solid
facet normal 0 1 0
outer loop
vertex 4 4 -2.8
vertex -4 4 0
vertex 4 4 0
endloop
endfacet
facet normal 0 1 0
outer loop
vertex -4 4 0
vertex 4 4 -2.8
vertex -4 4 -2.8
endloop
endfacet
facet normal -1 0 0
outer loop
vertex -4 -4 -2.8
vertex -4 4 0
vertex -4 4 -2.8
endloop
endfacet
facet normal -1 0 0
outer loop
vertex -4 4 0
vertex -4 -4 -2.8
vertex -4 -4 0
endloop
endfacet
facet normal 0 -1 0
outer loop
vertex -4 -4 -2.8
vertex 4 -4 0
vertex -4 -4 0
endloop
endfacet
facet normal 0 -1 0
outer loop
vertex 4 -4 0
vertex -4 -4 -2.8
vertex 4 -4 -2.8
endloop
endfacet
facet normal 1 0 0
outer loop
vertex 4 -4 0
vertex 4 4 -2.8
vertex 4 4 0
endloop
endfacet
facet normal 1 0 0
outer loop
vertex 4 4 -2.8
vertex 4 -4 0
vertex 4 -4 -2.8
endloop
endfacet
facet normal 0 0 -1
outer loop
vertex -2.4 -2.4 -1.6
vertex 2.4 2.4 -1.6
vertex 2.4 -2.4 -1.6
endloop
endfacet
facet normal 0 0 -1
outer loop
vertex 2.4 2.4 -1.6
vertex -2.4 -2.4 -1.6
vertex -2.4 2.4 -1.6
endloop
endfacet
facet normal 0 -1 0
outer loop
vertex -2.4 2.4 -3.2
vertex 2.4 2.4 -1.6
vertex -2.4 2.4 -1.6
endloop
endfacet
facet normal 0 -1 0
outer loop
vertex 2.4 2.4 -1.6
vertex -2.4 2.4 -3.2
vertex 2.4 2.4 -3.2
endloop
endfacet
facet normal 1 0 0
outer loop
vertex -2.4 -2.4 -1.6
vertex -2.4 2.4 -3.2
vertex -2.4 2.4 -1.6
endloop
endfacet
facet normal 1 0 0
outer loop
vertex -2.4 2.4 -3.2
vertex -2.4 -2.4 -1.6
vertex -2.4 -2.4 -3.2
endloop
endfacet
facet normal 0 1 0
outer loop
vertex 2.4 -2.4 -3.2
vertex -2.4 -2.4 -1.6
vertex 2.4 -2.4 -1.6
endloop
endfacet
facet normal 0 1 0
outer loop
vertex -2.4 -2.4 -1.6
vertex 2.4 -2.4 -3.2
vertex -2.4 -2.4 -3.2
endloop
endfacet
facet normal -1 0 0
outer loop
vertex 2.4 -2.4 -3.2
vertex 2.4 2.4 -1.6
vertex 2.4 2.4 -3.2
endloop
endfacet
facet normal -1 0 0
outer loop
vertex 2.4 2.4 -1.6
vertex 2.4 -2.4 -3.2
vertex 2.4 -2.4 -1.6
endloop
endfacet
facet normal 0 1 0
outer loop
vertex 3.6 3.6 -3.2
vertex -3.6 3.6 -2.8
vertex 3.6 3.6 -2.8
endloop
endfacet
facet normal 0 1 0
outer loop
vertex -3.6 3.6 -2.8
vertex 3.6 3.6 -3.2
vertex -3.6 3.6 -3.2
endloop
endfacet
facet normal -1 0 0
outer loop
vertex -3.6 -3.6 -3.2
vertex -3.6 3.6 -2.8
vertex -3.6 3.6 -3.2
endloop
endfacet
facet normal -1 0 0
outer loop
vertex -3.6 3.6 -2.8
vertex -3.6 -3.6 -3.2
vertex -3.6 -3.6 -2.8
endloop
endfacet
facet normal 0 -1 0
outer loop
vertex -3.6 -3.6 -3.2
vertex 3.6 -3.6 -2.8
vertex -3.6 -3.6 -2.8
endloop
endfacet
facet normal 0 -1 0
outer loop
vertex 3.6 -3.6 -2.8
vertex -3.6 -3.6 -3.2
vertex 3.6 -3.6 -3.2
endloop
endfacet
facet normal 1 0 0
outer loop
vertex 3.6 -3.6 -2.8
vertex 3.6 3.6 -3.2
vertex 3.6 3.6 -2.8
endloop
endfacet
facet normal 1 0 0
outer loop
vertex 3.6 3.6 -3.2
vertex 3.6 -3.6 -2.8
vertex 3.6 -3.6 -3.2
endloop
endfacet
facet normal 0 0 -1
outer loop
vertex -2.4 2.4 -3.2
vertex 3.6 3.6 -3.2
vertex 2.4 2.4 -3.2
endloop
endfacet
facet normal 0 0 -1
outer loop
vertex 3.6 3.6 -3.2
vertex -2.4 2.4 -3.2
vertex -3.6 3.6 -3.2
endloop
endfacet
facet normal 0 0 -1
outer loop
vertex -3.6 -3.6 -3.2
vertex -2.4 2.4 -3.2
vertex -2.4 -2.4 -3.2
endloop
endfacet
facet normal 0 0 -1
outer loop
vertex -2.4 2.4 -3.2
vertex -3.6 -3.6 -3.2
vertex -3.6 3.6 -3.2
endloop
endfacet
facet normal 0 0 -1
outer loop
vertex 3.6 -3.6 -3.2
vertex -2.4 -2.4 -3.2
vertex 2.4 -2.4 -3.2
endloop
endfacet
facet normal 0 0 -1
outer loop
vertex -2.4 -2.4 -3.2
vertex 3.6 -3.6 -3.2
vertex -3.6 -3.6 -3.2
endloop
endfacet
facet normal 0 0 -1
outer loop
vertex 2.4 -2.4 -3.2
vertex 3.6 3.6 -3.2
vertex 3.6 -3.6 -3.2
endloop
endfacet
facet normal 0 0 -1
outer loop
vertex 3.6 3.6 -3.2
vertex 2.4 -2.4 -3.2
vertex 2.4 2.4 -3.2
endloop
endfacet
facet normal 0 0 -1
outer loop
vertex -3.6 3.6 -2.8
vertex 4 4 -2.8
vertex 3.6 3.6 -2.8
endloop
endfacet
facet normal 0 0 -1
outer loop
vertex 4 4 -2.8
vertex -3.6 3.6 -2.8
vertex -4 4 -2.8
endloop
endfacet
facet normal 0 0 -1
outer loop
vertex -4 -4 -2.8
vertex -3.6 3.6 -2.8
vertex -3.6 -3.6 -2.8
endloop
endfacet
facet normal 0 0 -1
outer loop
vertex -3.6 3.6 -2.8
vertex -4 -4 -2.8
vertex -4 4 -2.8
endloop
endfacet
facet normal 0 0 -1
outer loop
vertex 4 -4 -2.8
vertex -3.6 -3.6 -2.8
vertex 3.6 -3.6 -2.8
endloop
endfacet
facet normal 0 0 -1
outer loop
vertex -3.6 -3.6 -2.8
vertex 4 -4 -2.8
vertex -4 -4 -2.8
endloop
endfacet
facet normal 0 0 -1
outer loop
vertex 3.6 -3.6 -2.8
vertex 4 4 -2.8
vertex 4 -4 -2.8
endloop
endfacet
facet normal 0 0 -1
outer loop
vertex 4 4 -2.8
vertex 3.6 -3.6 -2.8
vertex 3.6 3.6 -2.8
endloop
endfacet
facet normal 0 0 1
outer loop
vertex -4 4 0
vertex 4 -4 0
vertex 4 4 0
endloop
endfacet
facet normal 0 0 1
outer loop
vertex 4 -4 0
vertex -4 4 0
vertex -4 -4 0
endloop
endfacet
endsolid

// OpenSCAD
// file: ../p/box5.scad
use <../lib.scad>
function ldraw_lib__box5() = [
// 0 Box with 5 Faces and All Edges
// 0 Name: box5.dat
// 0 Author: James Jessiman
// 0 !LDRAW_ORG Primitive UPDATE 2012-01
// 0 !LICENSE Licensed under CC BY 4.0 : see CAreadme.txt
// 
// 0 BFC CERTIFY CCW
  [0,"BFC","CERTIFY"],
  [0,"BFC","CCW"],
// 
// 0 !HISTORY 2002-04-03 [sbliss] Modified for BFC compliance
// 0 !HISTORY 2002-04-25 [PTadmin] Official Update 2002-02
// 0 !HISTORY 2007-06-24 [PTadmin] Header formatted for Contributor Agreement
// 0 !HISTORY 2008-07-01 [PTadmin] Official Update 2008-01
// 0 !HISTORY 2012-02-16 [Philo] Changed to CCW
// 0 !HISTORY 2012-03-30 [PTadmin] Official Update 2012-01
// 
// 
// 2 24 1 1 1 -1 1 1
  [2,24,1,1,1,-1,1,1],
// 2 24 -1 1 1 -1 1 -1
  [2,24,-1,1,1,-1,1,-1],
// 2 24 -1 1 -1 1 1 -1
  [2,24,-1,1,-1,1,1,-1],
// 2 24 1 1 -1 1 1 1
  [2,24,1,1,-1,1,1,1],
// 2 24 1 0 1 -1 0 1
  [2,24,1,0,1,-1,0,1],
// 2 24 -1 0 1 -1 0 -1
  [2,24,-1,0,1,-1,0,-1],
// 2 24 -1 0 -1 1 0 -1
  [2,24,-1,0,-1,1,0,-1],
// 2 24 1 0 -1 1 0 1
  [2,24,1,0,-1,1,0,1],
// 2 24 1 0 1 1 1 1
  [2,24,1,0,1,1,1,1],
// 2 24 -1 0 1 -1 1 1
  [2,24,-1,0,1,-1,1,1],
// 2 24 1 0 -1 1 1 -1
  [2,24,1,0,-1,1,1,-1],
// 2 24 -1 0 -1 -1 1 -1
  [2,24,-1,0,-1,-1,1,-1],
// 4 16 -1 1 1 1 1 1 1 1 -1 -1 1 -1
  [4,16,-1,1,1,1,1,1,1,1,-1,-1,1,-1],
// 4 16 -1 1 1 -1 0 1 1 0 1 1 1 1
  [4,16,-1,1,1,-1,0,1,1,0,1,1,1,1],
// 4 16 -1 1 -1 -1 0 -1 -1 0 1 -1 1 1
  [4,16,-1,1,-1,-1,0,-1,-1,0,1,-1,1,1],
// 4 16 1 1 -1 1 0 -1 -1 0 -1 -1 1 -1
  [4,16,1,1,-1,1,0,-1,-1,0,-1,-1,1,-1],
// 4 16 1 1 1 1 0 1 1 0 -1 1 1 -1
  [4,16,1,1,1,1,0,1,1,0,-1,1,1,-1],
];
module ldraw_lib__box5(step=0, col=false, unit=2/5, alt=false, line=0.2, solid=!$preview)
    makepoly(ldraw_lib__box5(), step=step, col=col, unit=unit, alt=alt, line=line, solid=solid);
ldraw_lib__box5(line=0.2);
// file: ../p/box4.scad
use <../lib.scad>
function ldraw_lib__box4() = [
// 0 Box with 4 Faces (2 Parallel Pairs) and All Edges
// 0 Name: box4.dat
// 0 Author: James Jessiman
// 0 !LDRAW_ORG Primitive UPDATE 2012-01
// 0 !LICENSE Licensed under CC BY 4.0 : see CAreadme.txt
// 
// 0 BFC CERTIFY CCW
  [0,"BFC","CERTIFY"],
  [0,"BFC","CCW"],
// 
// 0 !HISTORY 2002-04-03 [sbliss] Modified for BFC compliance
// 0 !HISTORY 2002-04-25 [PTadmin] Official Update 2002-02
// 0 !HISTORY 2007-06-24 [PTadmin] Header formatted for Contributor Agreement
// 0 !HISTORY 2008-07-01 [PTadmin] Official Update 2008-01
// 0 !HISTORY 2012-02-16 [Philo] Changed to CCW
// 0 !HISTORY 2012-03-30 [PTadmin] Official Update 2012-01
// 
// 
// 2 24 1 1 1 -1 1 1
  [2,24,1,1,1,-1,1,1],
// 2 24 -1 1 1 -1 1 -1
  [2,24,-1,1,1,-1,1,-1],
// 2 24 -1 1 -1 1 1 -1
  [2,24,-1,1,-1,1,1,-1],
// 2 24 1 1 -1 1 1 1
  [2,24,1,1,-1,1,1,1],
// 2 24 1 0 1 -1 0 1
  [2,24,1,0,1,-1,0,1],
// 2 24 -1 0 1 -1 0 -1
  [2,24,-1,0,1,-1,0,-1],
// 2 24 -1 0 -1 1 0 -1
  [2,24,-1,0,-1,1,0,-1],
// 2 24 1 0 -1 1 0 1
  [2,24,1,0,-1,1,0,1],
// 2 24 1 0 1 1 1 1
  [2,24,1,0,1,1,1,1],
// 2 24 -1 0 1 -1 1 1
  [2,24,-1,0,1,-1,1,1],
// 2 24 1 0 -1 1 1 -1
  [2,24,1,0,-1,1,1,-1],
// 2 24 -1 0 -1 -1 1 -1
  [2,24,-1,0,-1,-1,1,-1],
// 4 16 -1 1 1 -1 0 1 1 0 1 1 1 1
  [4,16,-1,1,1,-1,0,1,1,0,1,1,1,1],
// 4 16 -1 1 -1 -1 0 -1 -1 0 1 -1 1 1
  [4,16,-1,1,-1,-1,0,-1,-1,0,1,-1,1,1],
// 4 16 1 1 -1 1 0 -1 -1 0 -1 -1 1 -1
  [4,16,1,1,-1,1,0,-1,-1,0,-1,-1,1,-1],
// 4 16 1 1 1 1 0 1 1 0 -1 1 1 -1
  [4,16,1,1,1,1,0,1,1,0,-1,1,1,-1],
];
module ldraw_lib__box4(step=0, col=false, unit=2/5, alt=false, line=0.2, solid=!$preview)
    makepoly(ldraw_lib__box4(), step=step, col=col, unit=unit, alt=alt, line=line, solid=solid);
ldraw_lib__box4(line=0.2);
// file: s/3070bs01.scad
use <../../lib.scad>
use <../../p/box4.scad>
use <../../p/box5.scad>
function ldraw_lib__s__3070bs01() = [
// 0 ~Tile  1 x  1 with Groove without Top Face
// 0 Name: s\3070bs01.dat
// 0 Author: Chris Dee [cwdee]
// 0 !LDRAW_ORG Subpart UPDATE 2009-02
// 0 !LICENSE Licensed under CC BY 4.0 : see CAreadme.txt
// 
// 0 BFC CERTIFY CCW
  [0,"BFC","CERTIFY"],
  [0,"BFC","CCW"],
// 
// 0 !HISTORY 2009-09-03 [PTadmin] Official Update 2009-02
// 
// 
// 1 16 0 0 0 10 0 0 0 7 0 0 0 10 box4.dat
  [1,16,0,0,0,10,0,0,0,7,0,0,0,10, ldraw_lib__box4()],
// 0 BFC INVERTNEXT
  [0,"BFC","INVERTNEXT"],
// 1 16 0 8 0 6 0 0 0 -4 0 0 0 6 box5.dat
  [1,16,0,8,0,6,0,0,0,-4,0,0,0,6, ldraw_lib__box5()],
// 1 16 0 7 0 9 0 0 0 1 0 0 0 9 box4.dat
  [1,16,0,7,0,9,0,0,0,1,0,0,0,9, ldraw_lib__box4()],
// 
// 4 16 9 8 9 6 8 6 -6 8 6 -9 8 9
  [4,16,9,8,9,6,8,6,-6,8,6,-9,8,9],
// 4 16 -9 8 9 -6 8 6 -6 8 -6 -9 8 -9
  [4,16,-9,8,9,-6,8,6,-6,8,-6,-9,8,-9],
// 4 16 -9 8 -9 -6 8 -6 6 8 -6 9 8 -9
  [4,16,-9,8,-9,-6,8,-6,6,8,-6,9,8,-9],
// 4 16 9 8 -9 6 8 -6 6 8 6 9 8 9
  [4,16,9,8,-9,6,8,-6,6,8,6,9,8,9],
// 
// 4 16 10 7 10 9 7 9 -9 7 9 -10 7 10
  [4,16,10,7,10,9,7,9,-9,7,9,-10,7,10],
// 4 16 -10 7 10 -9 7 9 -9 7 -9 -10 7 -10
  [4,16,-10,7,10,-9,7,9,-9,7,-9,-10,7,-10],
// 4 16 -10 7 -10 -9 7 -9 9 7 -9 10 7 -10
  [4,16,-10,7,-10,-9,7,-9,9,7,-9,10,7,-10],
// 4 16 10 7 -10 9 7 -9 9 7 9 10 7 10
  [4,16,10,7,-10,9,7,-9,9,7,9,10,7,10],
// 0
];
module ldraw_lib__s__3070bs01(step=0, col=false, unit=2/5, alt=false, line=0.2, solid=!$preview)
    makepoly(ldraw_lib__s__3070bs01(), step=step, col=col, unit=unit, alt=alt, line=line, solid=solid);
ldraw_lib__s__3070bs01(line=0.2);
// file: 3070b.scad
use <../lib.scad>
use <s/3070bs01.scad>
function ldraw_lib__3070b() = [
// 0 Tile  1 x  1 with Groove
// 0 Name: 3070b.dat
// 0 Author: Chris Dee [cwdee]
// 0 !LDRAW_ORG Part UPDATE 2009-02
// 0 !LICENSE Licensed under CC BY 4.0 : see CAreadme.txt
// 
// 0 BFC CERTIFY CW
  [0,"BFC","CERTIFY"],
  [0,"BFC","CW"],
// 
// 0 !HISTORY 2009-09-03 [PTadmin] Official Update 2009-02
// 
// 
// 1 16 0 0 0 1 0 0 0 1 0 0 0 1 s\3070bs01.dat
  [1,16,0,0,0,1,0,0,0,1,0,0,0,1, ldraw_lib__s__3070bs01()],
// 4 16 10 0 10 10 0 -10 -10 0 -10 -10 0 10
  [4,16,10,0,10,10,0,-10,-10,0,-10,-10,0,10],
// 0
];
module ldraw_lib__3070b(step=0, col=false, unit=2/5, alt=false, line=0.2, solid=!$preview)
    makepoly(ldraw_lib__3070b(), step=step, col=col, unit=unit, alt=alt, line=line, solid=solid);
ldraw_lib__3070b(line=0.2);
// main file
use <../lib.scad>
use <3070b.scad>
function ldraw_lib__307024() = [
// 0 ~_Tile  1 x  1 with Groove Yellow (Obsolete)
// 0 Name: 307024.dat
// 0 Author: Michael Heidemann [mikeheide]
// 0 !LDRAW_ORG Part Physical_Colour UPDATE 2019-02
// 0 !LICENSE Licensed under CC BY 4.0 : see CAreadme.txt
// 
// 0 BFC CERTIFY CCW
  [0,"BFC","CERTIFY"],
  [0,"BFC","CCW"],
// 
// 0 !CATEGORY Obsolete
// 
// 0 !HISTORY 2010-12-31 [PTadmin] Official Update 2010-03
// 0 !HISTORY 2019-07-22 [Holly-Wood] Obsoleted per decision not to include physical colour parts
// 0 !HISTORY 2019-09-09 [PTadmin] Official Update 2019-02
// 
// 
// 0 // This file is a "shortcut" with the correct number for the actual
// 0 // colouring of the part (Yellow).
// 
// 1 14 0 0 0 1 0 0 0 1 0 0 0 1 3070b.dat
  [1,14,0,0,0,1,0,0,0,1,0,0,0,1, ldraw_lib__3070b()],
];
module ldraw_lib__307024(step=0, col=false, unit=2/5, alt=false, line=0.2, solid=!$preview)
    makepoly(ldraw_lib__307024(), step=step, col=col, unit=unit, alt=alt, line=line, solid=solid);
ldraw_lib__307024(line=0.2);
